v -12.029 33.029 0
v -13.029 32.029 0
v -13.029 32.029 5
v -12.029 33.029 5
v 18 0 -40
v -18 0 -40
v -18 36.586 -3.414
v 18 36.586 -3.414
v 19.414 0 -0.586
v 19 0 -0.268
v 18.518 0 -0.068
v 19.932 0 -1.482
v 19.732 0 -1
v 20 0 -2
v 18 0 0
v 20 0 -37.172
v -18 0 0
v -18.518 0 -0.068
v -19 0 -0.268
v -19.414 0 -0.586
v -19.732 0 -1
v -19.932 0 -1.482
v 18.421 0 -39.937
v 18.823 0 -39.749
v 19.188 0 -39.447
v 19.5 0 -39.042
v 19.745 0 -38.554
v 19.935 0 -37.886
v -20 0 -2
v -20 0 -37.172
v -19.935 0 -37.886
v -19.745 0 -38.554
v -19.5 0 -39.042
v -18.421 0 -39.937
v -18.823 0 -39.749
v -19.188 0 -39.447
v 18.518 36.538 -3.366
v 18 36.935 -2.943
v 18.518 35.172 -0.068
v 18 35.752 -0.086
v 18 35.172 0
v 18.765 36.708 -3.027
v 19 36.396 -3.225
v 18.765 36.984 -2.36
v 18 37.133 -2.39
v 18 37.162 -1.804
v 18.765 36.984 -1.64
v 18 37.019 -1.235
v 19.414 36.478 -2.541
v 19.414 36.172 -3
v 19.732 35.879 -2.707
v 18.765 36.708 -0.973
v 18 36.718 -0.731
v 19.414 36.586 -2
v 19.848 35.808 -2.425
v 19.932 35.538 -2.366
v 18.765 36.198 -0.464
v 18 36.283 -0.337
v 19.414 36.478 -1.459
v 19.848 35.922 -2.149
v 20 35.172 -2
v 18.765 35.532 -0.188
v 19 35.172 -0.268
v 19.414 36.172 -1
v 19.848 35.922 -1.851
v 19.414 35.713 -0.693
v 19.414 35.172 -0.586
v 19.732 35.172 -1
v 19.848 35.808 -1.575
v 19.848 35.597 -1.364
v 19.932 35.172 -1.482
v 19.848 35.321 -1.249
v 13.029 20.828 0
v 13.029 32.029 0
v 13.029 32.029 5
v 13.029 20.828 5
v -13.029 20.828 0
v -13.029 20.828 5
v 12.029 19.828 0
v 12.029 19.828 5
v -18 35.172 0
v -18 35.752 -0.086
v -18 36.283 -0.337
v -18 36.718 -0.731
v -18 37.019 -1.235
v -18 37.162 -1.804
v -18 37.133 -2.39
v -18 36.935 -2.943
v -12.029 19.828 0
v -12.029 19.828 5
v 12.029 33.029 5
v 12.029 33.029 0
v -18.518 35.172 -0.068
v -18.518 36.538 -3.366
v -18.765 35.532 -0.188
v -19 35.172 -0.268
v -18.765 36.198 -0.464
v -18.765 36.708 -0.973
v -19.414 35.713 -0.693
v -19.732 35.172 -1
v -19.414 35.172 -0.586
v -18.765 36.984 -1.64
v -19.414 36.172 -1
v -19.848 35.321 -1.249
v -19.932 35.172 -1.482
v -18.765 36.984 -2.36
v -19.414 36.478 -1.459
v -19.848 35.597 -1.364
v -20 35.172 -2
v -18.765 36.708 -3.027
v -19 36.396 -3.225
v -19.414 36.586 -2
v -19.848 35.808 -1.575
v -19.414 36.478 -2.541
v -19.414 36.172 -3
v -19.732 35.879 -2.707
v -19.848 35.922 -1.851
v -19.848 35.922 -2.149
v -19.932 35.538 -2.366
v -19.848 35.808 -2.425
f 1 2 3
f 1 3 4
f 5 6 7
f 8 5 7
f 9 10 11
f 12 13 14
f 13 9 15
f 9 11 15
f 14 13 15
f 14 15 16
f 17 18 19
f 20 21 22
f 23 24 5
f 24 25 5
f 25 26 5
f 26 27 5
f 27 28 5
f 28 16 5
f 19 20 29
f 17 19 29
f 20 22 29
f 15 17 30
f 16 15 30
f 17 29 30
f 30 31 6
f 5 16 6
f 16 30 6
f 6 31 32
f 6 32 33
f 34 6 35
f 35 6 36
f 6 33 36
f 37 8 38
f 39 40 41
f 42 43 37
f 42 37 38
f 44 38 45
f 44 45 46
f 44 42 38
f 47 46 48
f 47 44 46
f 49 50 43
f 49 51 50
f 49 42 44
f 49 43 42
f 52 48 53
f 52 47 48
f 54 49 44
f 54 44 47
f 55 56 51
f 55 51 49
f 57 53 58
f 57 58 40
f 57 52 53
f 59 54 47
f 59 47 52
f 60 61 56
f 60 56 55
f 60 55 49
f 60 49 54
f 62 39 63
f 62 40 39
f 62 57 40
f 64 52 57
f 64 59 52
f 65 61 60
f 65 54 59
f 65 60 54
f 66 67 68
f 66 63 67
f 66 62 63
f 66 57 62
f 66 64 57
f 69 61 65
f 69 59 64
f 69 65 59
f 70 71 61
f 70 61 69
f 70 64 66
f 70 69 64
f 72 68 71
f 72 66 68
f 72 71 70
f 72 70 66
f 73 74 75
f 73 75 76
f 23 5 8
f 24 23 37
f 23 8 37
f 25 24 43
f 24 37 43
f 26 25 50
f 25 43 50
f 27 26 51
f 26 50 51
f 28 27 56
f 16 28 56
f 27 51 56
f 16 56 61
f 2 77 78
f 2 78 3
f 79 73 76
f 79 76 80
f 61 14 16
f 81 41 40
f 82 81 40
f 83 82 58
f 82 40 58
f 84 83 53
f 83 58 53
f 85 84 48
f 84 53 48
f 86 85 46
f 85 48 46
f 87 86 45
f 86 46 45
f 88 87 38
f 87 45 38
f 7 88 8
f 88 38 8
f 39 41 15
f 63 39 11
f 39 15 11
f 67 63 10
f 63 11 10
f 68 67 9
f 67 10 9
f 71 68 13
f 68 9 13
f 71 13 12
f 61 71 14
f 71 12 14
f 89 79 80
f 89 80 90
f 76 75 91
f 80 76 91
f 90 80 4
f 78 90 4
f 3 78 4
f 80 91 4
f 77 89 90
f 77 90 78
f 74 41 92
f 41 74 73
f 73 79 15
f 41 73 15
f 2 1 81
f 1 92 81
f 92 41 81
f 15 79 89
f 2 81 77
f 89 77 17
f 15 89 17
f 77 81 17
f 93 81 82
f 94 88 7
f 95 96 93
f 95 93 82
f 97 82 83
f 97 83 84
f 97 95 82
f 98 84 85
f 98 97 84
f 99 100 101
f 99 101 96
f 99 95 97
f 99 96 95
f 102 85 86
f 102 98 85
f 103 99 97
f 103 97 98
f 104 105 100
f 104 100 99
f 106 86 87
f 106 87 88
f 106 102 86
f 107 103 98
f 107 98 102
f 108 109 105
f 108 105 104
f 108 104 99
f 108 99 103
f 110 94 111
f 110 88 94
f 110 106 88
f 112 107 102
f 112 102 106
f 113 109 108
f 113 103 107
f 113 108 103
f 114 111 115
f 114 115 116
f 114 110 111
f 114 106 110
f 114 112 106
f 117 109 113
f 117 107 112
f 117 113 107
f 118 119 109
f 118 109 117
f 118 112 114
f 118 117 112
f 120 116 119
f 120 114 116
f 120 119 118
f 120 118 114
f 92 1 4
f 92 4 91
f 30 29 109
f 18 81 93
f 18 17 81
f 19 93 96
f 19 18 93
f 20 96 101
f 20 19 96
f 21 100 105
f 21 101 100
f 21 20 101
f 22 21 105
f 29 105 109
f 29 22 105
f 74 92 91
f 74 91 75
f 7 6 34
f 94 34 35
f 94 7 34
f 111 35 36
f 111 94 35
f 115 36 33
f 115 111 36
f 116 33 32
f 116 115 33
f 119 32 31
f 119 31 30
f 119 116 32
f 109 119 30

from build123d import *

# Parameters (mm, degrees)
Y_KSEKLIK_EKSTR_ZYON1_DEPTH      = 20
Y_KSEKLIK_EKSTR_ZYON1_DEPTH_BACK = 20
Y_KSEKLIK_EKSTR_ZYON2_DEPTH      = 5
RADYUS1_R                        = 2
RADYUS2_R                        = 2


with BuildPart() as part:
    # Çizim1 → Yükseklik-Ekstrüzyon1 (new, two sides: drawn at the far end of the back side and taken through both)
    with BuildSketch(Plane(origin=(0, 0, 0), x_dir=(0, 0, -1), z_dir=(1, 0, 0)).offset(-Y_KSEKLIK_EKSTR_ZYON1_DEPTH_BACK)):
        Polygon((0, 0), (40, 0), (0, 40), align=None)
    extrude(amount=Y_KSEKLIK_EKSTR_ZYON1_DEPTH + Y_KSEKLIK_EKSTR_ZYON1_DEPTH_BACK)

    # Çizim3 → Yükseklik-Ekstrüzyon2 (add)
    with BuildSketch(Plane.XY):
        Polygon((-13.028588348, 32.028588348), (-12.028588348, 33.028588348), (12.028588348, 33.028588348), (13.028588348, 32.028588348), (13.028588348, 20.827816013), (12.028588348, 19.827816013), (-12.028588348, 19.827816013), (-13.028588348, 20.827816013), align=None)
    extrude(amount=Y_KSEKLIK_EKSTR_ZYON2_DEPTH)

    # Radyus1
    radyus1_edges = [part.edges().sort_by_distance(p)[0] for p in [
        (20, 20, 0),
        (20, 20, -20),
        (-20, 20, -20),
        (-20, 20, 0),
    ]]
    fillet(radyus1_edges, radius=RADYUS1_R)

    # Radyus2
    # the kernel refuses this fillet: 2 mm, written as the material it takes off along each edge
    with BuildSketch(Plane(origin=(18, 35.171572875, -2), x_dir=(0, 0, 1), z_dir=(1, 0, 0))) as radyus2_piece_1_section:
        Polygon((0, 0), (RADYUS2_R, 0), (RADYUS2_R, -RADYUS2_R * 2.41421356237), (-RADYUS2_R * 0.707106781187, -RADYUS2_R * 0.707106781187), align=None)
    radyus2_piece_1 = extrude(amount=RADYUS2_R, mode=Mode.PRIVATE)
    radyus2_piece_1 = radyus2_piece_1 - Plane(origin=(18, 35.171572875, -2), x_dir=(0, -0.9238795325112866, -0.38268343236508967), z_dir=(1, 0, 0)) * Sphere(RADYUS2_R, mode=Mode.PRIVATE)
    add(radyus2_piece_1, mode=Mode.SUBTRACT)
    with BuildSketch(Plane(origin=(-18, 35.171572875, -2), x_dir=(0, 0, 1), z_dir=(-1, 0, 0))) as radyus2_piece_2_section:
        Polygon((0, 0), (RADYUS2_R, 0), (RADYUS2_R, RADYUS2_R * 2.41421356237), (-RADYUS2_R * 0.707106781187, RADYUS2_R * 0.707106781187), align=None)
    radyus2_piece_2 = extrude(amount=RADYUS2_R, mode=Mode.PRIVATE)
    radyus2_piece_2 = radyus2_piece_2 - Plane(origin=(-18, 35.171572875, -2), x_dir=(0, -0.9238795325112866, -0.38268343236508967), z_dir=(-1, 0, 0)) * Sphere(RADYUS2_R, mode=Mode.PRIVATE)
    add(radyus2_piece_2, mode=Mode.SUBTRACT)
    with BuildSketch(Plane(origin=(18, 40, 0), x_dir=(0, -1, 0), z_dir=(-1, 0, 0))) as radyus2_piece_3:
        with BuildLine():
            CenterArc((RADYUS2_R * 2.41421356237, -RADYUS2_R), RADYUS2_R, 90, 135)
            Line((RADYUS2_R * 1.70710678119, -RADYUS2_R * 1.70710678119), (0, 0))
            Line((0, 0), (RADYUS2_R * 2.41421356237, 0))
        make_face()
    extrude(amount=36, mode=Mode.SUBTRACT)


solid = part.part
